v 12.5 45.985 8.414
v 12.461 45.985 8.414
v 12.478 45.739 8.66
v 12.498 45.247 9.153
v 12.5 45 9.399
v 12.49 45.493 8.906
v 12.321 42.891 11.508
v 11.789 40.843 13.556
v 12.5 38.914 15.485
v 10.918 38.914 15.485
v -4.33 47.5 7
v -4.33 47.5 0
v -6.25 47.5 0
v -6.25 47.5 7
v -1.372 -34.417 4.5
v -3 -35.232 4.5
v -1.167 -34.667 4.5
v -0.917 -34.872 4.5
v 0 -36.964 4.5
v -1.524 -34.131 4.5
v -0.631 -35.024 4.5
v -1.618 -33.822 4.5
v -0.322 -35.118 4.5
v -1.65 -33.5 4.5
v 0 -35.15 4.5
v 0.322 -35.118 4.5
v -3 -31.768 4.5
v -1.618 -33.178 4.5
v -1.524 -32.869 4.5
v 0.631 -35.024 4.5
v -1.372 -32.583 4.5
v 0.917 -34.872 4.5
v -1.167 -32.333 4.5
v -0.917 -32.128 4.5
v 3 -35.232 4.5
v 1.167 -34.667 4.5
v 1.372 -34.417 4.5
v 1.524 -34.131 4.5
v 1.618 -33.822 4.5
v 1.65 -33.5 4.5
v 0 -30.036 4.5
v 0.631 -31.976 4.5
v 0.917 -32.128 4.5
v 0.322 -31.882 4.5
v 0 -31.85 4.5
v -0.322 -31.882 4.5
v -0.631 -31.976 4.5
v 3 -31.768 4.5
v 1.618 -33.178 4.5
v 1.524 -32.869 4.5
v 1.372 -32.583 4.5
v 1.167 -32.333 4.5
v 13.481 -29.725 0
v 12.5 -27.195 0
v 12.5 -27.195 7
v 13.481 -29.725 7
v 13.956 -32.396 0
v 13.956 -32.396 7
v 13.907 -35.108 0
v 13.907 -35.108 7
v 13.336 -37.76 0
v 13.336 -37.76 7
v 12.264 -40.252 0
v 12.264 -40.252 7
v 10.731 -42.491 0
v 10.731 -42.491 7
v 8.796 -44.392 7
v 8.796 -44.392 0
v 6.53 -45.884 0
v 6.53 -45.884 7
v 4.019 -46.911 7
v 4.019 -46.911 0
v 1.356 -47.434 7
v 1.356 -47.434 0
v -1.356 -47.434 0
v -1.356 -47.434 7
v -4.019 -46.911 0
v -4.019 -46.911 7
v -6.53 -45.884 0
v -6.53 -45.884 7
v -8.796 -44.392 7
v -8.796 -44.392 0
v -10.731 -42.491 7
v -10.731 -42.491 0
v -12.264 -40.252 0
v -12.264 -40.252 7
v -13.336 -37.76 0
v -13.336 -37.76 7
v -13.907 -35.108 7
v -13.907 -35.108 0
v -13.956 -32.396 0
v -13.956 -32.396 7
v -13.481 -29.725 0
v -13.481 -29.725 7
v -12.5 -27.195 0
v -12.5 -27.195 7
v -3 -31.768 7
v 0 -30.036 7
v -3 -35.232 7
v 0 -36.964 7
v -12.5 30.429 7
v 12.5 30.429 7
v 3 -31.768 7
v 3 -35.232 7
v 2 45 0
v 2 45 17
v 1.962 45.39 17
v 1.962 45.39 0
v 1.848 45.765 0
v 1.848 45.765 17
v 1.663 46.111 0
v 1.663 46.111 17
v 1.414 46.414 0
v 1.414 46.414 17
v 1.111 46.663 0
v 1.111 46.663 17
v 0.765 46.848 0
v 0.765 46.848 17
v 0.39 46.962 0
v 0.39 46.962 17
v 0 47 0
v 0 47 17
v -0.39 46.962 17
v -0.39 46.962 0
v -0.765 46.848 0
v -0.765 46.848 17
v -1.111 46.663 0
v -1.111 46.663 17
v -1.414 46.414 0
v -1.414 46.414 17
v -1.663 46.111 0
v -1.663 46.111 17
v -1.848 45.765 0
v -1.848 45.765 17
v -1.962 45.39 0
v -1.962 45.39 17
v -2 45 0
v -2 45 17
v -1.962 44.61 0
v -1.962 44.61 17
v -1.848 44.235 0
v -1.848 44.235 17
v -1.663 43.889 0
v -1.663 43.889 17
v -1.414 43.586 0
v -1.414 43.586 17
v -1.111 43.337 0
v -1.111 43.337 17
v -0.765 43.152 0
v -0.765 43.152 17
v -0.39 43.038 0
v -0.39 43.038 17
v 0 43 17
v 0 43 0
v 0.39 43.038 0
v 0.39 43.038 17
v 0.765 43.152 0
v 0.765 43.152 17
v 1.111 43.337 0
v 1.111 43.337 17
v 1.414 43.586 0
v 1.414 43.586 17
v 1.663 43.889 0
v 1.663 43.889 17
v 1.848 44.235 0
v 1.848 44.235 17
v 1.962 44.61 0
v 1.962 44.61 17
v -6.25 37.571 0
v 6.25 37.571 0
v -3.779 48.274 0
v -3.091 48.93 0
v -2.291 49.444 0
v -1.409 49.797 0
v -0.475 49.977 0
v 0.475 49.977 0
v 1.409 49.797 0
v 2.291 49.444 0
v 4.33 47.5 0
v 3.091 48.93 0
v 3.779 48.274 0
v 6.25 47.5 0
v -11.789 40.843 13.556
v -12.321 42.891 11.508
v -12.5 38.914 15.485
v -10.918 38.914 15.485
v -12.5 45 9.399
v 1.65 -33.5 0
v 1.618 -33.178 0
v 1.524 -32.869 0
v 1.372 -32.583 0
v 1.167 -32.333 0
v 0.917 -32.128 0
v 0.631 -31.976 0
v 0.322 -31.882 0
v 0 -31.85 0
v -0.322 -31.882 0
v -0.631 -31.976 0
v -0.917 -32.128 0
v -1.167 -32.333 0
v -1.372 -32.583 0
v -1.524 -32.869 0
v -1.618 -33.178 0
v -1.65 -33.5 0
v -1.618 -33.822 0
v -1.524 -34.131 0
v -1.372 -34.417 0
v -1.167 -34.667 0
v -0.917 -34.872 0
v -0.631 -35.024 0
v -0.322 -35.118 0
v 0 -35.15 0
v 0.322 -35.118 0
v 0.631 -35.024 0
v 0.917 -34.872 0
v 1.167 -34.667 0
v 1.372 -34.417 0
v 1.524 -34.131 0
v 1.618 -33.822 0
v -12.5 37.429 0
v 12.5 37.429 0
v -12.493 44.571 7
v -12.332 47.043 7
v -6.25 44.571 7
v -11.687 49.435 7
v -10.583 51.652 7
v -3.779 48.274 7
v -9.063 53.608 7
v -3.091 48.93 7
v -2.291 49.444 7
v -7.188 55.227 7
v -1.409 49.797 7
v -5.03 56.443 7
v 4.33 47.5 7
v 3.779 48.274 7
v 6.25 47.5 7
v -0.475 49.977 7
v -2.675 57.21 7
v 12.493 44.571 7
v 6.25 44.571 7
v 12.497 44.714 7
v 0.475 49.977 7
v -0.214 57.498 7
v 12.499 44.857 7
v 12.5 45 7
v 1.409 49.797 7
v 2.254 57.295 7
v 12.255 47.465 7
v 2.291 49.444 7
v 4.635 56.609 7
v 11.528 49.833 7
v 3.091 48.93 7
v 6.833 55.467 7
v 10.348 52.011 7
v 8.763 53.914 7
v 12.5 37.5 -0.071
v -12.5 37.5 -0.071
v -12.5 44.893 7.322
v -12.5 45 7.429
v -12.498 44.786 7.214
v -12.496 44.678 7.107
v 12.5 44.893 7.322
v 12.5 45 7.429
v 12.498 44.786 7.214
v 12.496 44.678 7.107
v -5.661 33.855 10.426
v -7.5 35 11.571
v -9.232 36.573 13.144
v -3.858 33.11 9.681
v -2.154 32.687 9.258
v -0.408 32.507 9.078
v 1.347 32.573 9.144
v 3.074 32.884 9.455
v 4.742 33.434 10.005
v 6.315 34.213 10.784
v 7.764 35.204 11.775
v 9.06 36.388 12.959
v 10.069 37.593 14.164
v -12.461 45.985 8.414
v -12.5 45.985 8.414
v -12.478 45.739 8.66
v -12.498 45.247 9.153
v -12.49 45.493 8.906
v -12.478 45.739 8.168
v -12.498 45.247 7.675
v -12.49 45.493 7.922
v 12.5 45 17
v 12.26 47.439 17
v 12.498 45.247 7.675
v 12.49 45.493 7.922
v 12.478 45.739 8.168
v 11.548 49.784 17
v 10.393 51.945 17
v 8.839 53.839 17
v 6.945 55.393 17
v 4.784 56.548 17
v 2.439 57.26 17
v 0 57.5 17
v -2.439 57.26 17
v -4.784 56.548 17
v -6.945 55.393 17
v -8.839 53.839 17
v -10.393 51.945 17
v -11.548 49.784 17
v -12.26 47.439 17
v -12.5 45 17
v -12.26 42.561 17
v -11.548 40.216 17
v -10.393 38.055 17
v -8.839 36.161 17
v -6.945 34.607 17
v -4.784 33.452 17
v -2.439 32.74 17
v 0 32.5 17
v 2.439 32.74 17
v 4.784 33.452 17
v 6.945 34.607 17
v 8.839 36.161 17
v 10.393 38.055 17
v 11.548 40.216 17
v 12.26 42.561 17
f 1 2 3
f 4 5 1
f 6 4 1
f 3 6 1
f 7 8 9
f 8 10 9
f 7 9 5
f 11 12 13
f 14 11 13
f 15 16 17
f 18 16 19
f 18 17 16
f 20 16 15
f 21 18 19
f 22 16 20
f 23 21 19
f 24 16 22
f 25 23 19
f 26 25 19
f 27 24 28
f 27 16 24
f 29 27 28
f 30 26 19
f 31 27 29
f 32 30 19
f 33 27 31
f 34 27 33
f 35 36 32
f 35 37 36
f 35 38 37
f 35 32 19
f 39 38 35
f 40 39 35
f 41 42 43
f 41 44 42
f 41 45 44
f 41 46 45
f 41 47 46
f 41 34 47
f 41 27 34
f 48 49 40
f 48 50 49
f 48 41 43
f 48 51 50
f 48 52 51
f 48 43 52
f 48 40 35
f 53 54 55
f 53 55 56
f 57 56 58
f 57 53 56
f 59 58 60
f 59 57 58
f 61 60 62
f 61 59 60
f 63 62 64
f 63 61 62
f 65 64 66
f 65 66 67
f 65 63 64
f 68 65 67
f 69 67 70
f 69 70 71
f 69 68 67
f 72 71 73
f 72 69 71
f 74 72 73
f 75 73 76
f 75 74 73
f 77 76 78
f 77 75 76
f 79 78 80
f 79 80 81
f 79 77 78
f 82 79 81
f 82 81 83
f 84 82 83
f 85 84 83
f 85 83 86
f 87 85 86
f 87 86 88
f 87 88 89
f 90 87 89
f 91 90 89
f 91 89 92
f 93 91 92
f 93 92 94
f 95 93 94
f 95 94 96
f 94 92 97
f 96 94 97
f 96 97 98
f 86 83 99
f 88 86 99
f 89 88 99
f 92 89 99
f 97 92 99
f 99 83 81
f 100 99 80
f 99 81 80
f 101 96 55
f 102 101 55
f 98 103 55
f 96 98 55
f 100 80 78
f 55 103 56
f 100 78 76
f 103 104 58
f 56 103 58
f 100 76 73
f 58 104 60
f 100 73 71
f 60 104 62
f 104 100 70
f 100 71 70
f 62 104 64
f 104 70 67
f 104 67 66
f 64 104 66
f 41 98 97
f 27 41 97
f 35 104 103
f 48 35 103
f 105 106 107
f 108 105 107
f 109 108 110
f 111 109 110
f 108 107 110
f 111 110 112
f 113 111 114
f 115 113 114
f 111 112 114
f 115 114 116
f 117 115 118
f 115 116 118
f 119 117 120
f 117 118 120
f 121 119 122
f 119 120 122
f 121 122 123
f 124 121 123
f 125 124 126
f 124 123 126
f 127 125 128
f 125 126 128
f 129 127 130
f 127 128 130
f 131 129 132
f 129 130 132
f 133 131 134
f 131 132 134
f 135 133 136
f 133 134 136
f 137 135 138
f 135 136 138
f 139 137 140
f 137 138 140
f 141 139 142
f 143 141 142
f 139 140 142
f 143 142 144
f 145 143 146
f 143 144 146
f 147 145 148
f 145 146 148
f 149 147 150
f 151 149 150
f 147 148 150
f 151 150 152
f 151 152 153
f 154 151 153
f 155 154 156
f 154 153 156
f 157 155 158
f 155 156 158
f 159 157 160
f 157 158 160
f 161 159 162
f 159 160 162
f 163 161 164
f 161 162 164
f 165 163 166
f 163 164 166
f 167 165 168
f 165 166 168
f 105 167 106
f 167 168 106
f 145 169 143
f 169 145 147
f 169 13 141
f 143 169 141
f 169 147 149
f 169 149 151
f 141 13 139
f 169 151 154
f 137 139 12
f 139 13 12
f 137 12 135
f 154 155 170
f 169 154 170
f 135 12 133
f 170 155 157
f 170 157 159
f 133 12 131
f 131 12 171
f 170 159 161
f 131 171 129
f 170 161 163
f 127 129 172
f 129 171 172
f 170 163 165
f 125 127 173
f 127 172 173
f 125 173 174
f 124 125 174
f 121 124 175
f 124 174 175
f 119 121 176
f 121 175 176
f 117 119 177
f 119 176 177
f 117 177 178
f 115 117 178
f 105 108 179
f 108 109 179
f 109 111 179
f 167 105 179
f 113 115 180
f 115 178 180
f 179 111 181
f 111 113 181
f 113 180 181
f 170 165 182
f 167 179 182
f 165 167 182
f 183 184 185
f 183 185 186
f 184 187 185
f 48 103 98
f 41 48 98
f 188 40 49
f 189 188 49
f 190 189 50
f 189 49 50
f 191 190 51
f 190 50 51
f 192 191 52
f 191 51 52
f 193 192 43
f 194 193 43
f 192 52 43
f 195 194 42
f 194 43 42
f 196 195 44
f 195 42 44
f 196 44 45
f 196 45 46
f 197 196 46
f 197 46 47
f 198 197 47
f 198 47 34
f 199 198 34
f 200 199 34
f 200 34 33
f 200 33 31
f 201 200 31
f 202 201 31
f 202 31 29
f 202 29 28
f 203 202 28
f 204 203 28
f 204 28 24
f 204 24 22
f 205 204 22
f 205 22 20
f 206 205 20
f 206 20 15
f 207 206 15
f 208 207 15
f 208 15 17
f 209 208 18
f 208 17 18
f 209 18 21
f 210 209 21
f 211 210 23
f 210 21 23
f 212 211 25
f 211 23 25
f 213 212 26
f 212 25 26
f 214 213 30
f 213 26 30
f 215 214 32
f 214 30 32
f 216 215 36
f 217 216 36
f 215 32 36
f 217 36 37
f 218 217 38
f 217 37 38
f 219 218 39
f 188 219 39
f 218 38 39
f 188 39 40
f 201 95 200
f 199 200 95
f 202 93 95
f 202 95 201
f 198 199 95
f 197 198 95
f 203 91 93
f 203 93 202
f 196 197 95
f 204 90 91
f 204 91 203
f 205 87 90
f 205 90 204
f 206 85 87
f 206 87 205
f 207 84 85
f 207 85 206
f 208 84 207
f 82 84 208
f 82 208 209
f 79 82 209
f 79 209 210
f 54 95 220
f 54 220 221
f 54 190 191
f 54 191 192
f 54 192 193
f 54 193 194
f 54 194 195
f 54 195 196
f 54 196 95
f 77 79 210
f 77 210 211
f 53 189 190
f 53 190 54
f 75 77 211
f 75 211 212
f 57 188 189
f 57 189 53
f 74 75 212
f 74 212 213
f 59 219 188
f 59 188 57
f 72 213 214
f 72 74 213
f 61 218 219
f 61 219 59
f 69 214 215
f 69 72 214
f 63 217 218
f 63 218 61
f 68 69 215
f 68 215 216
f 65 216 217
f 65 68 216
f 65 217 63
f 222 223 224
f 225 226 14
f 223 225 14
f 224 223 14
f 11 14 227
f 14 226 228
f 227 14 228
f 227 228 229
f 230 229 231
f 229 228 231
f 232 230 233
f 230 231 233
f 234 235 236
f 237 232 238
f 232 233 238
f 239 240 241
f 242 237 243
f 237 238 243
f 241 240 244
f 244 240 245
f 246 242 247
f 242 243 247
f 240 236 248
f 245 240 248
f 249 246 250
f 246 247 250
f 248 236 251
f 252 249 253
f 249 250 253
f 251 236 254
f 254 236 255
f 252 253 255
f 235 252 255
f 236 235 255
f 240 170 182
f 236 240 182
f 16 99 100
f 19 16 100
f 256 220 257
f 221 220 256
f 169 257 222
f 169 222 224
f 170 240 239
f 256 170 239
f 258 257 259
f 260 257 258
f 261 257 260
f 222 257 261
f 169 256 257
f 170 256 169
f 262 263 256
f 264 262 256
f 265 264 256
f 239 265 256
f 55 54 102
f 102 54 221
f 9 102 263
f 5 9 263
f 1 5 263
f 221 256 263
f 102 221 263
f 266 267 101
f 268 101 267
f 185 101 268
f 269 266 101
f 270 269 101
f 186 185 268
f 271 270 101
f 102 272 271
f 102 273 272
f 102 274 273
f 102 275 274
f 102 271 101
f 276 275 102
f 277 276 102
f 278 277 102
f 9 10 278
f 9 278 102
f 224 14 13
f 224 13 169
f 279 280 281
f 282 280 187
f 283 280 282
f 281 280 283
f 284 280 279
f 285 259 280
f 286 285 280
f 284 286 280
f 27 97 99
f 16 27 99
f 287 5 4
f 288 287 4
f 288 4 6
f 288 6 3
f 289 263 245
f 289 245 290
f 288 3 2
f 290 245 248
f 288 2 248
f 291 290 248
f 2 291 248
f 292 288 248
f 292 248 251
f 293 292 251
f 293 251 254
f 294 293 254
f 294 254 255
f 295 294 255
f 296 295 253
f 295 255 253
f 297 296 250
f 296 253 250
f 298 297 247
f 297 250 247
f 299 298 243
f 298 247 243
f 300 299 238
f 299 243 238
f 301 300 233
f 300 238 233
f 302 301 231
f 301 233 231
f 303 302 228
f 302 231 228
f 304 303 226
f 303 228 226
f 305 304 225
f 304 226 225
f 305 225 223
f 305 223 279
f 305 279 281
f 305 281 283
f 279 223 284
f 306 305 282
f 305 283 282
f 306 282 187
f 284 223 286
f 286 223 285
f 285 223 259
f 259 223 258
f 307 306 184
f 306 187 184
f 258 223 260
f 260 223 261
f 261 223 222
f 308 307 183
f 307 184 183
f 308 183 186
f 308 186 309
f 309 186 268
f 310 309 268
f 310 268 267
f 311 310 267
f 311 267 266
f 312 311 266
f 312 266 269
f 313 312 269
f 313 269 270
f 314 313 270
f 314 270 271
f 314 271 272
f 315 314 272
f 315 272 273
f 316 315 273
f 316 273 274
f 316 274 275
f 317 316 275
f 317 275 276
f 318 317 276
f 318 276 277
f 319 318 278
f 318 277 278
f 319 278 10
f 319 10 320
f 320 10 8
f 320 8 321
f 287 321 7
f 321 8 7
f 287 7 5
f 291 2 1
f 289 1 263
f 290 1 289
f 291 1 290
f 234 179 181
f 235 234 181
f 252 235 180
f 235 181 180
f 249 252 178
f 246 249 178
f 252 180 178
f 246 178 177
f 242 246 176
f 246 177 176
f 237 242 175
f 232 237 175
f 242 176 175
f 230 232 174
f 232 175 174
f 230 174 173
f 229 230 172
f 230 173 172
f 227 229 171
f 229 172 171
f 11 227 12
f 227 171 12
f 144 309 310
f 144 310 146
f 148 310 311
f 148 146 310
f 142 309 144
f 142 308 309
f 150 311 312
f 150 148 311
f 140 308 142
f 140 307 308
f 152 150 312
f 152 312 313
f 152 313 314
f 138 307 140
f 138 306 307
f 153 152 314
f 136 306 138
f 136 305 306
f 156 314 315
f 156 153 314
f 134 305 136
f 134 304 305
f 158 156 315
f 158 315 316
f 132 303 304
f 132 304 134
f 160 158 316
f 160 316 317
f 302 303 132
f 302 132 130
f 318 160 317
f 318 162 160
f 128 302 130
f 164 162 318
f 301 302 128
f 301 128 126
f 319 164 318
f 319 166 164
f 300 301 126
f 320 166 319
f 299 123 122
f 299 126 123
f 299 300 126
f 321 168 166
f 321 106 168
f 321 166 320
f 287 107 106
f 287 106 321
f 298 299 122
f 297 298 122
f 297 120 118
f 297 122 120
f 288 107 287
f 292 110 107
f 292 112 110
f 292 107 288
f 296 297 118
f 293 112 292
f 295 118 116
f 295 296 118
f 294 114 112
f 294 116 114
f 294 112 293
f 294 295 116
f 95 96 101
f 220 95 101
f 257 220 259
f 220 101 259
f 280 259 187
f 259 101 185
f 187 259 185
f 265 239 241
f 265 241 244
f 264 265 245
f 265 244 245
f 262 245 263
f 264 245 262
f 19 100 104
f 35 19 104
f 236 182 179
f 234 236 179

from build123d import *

# Parameters (mm, degrees)
F1_DEPTH  = 7
F2_R      = 12.5
F3_DEPTH  = 10
F4_R      = 2
F5_DEPTH  = 7
F9_W      = 25
F9_H      = 12
F10_DEPTH = 10
F11_R     = 2
F12_DEPTH = 17
F13_R     = 14
F14_DEPTH = 7
F15_R     = 1.65
F16_DEPTH = 7
F18_DEPTH = 2.5


with BuildPart() as f1:
    # F0 (on Top) → F1 (new body)
    with BuildSketch(Plane.XY):
        Polygon((-12.5, -37.5), (12.5, -37.5), (12.5, 37.5), (6.25, 37.5), (-6.25, 37.5), (-12.5, 37.5), align=None)
        with BuildLine():
            Line((-6.25, 37.5), (6.25, 37.5))
            Line((6.25, 37.5), (6.25, 47.5))
            Line((6.25, 47.5), (4.3301270189, 47.5))
            ThreePointArc((4.3301270189, 47.5), (4.8296291314, 46.2940952255), (5, 45))
            ThreePointArc((5, 45), (-1.2940952255, 40.1703708686), (-4.3301270189, 47.5))
            Line((-4.3301270189, 47.5), (-6.25, 47.5))
            Line((-6.25, 47.5), (-6.25, 37.5))
        make_face()
        with BuildLine():
            ThreePointArc((5, 45), (4.8296291314, 46.2940952255), (4.3301270189, 47.5))
            Line((4.3301270189, 47.5), (-4.3301270189, 47.5))
            ThreePointArc((-4.3301270189, 47.5), (-1.2940952255, 40.1703708686), (5, 45))
        make_face()
        with BuildLine():
            Line((-4.3301270189, 47.5), (4.3301270189, 47.5))
            ThreePointArc((4.3301270189, 47.5), (0, 50), (-4.3301270189, 47.5))
        make_face()
    extrude(amount=F1_DEPTH)

    # F2 (on face) → F3 (join)
    with BuildSketch(Plane.XY.offset(7)):
        with Locations((0, 45)):
            Circle(F2_R)
    extrude(amount=F3_DEPTH)

    # F4 (on face) → F5 (cut, through all)
    with BuildSketch(Plane.XY.offset(7)):
        with Locations((0, -33.5)):
            Circle(F4_R)
    extrude(amount=-F5_DEPTH, mode=Mode.SUBTRACT)

    # F9 (on offset) → F10 (join)
    with BuildSketch(Plane(origin=(0, 11.7144660941, -11.7144660941), x_dir=(1, 0, 0), z_dir=(0, -0.7071067812, 0.7071067812))):
        with Locations((0, 32.4662517628)):
            Rectangle(F9_W, F9_H)
    extrude(amount=-F10_DEPTH)

    # F11 (on face) → F12 (cut, through all)
    with BuildSketch(Plane.XY.offset(17)):
        with Locations((0, 45)):
            Circle(F11_R)
    extrude(amount=-F12_DEPTH, mode=Mode.SUBTRACT)

    # F13 (on face) → F14 (join, through all)
    with BuildSketch(Plane(origin=(0, 0, 0), x_dir=(1, 0, 0), z_dir=(0, 0, -1))):
        with Locations((0, 33.5)):
            Circle(F13_R)
    extrude(amount=-F14_DEPTH)

    # F15 (on face) → F16 (cut, through all)
    with BuildSketch(Plane.XY.offset(7)):
        with Locations((0, -33.5)):
            Circle(F15_R)
    extrude(amount=-F16_DEPTH, mode=Mode.SUBTRACT)

    # F17 (on face) → F18 (cut)
    with BuildSketch(Plane.XY.offset(7)):
        Polygon((0, -36.9641016151), (3, -35.2320508076), (3, -31.7679491924), (0, -30.0358983849), (-3, -31.7679491924), (-3, -35.2320508076), align=None)
    extrude(amount=-F18_DEPTH, mode=Mode.SUBTRACT)


solid = f1.part
